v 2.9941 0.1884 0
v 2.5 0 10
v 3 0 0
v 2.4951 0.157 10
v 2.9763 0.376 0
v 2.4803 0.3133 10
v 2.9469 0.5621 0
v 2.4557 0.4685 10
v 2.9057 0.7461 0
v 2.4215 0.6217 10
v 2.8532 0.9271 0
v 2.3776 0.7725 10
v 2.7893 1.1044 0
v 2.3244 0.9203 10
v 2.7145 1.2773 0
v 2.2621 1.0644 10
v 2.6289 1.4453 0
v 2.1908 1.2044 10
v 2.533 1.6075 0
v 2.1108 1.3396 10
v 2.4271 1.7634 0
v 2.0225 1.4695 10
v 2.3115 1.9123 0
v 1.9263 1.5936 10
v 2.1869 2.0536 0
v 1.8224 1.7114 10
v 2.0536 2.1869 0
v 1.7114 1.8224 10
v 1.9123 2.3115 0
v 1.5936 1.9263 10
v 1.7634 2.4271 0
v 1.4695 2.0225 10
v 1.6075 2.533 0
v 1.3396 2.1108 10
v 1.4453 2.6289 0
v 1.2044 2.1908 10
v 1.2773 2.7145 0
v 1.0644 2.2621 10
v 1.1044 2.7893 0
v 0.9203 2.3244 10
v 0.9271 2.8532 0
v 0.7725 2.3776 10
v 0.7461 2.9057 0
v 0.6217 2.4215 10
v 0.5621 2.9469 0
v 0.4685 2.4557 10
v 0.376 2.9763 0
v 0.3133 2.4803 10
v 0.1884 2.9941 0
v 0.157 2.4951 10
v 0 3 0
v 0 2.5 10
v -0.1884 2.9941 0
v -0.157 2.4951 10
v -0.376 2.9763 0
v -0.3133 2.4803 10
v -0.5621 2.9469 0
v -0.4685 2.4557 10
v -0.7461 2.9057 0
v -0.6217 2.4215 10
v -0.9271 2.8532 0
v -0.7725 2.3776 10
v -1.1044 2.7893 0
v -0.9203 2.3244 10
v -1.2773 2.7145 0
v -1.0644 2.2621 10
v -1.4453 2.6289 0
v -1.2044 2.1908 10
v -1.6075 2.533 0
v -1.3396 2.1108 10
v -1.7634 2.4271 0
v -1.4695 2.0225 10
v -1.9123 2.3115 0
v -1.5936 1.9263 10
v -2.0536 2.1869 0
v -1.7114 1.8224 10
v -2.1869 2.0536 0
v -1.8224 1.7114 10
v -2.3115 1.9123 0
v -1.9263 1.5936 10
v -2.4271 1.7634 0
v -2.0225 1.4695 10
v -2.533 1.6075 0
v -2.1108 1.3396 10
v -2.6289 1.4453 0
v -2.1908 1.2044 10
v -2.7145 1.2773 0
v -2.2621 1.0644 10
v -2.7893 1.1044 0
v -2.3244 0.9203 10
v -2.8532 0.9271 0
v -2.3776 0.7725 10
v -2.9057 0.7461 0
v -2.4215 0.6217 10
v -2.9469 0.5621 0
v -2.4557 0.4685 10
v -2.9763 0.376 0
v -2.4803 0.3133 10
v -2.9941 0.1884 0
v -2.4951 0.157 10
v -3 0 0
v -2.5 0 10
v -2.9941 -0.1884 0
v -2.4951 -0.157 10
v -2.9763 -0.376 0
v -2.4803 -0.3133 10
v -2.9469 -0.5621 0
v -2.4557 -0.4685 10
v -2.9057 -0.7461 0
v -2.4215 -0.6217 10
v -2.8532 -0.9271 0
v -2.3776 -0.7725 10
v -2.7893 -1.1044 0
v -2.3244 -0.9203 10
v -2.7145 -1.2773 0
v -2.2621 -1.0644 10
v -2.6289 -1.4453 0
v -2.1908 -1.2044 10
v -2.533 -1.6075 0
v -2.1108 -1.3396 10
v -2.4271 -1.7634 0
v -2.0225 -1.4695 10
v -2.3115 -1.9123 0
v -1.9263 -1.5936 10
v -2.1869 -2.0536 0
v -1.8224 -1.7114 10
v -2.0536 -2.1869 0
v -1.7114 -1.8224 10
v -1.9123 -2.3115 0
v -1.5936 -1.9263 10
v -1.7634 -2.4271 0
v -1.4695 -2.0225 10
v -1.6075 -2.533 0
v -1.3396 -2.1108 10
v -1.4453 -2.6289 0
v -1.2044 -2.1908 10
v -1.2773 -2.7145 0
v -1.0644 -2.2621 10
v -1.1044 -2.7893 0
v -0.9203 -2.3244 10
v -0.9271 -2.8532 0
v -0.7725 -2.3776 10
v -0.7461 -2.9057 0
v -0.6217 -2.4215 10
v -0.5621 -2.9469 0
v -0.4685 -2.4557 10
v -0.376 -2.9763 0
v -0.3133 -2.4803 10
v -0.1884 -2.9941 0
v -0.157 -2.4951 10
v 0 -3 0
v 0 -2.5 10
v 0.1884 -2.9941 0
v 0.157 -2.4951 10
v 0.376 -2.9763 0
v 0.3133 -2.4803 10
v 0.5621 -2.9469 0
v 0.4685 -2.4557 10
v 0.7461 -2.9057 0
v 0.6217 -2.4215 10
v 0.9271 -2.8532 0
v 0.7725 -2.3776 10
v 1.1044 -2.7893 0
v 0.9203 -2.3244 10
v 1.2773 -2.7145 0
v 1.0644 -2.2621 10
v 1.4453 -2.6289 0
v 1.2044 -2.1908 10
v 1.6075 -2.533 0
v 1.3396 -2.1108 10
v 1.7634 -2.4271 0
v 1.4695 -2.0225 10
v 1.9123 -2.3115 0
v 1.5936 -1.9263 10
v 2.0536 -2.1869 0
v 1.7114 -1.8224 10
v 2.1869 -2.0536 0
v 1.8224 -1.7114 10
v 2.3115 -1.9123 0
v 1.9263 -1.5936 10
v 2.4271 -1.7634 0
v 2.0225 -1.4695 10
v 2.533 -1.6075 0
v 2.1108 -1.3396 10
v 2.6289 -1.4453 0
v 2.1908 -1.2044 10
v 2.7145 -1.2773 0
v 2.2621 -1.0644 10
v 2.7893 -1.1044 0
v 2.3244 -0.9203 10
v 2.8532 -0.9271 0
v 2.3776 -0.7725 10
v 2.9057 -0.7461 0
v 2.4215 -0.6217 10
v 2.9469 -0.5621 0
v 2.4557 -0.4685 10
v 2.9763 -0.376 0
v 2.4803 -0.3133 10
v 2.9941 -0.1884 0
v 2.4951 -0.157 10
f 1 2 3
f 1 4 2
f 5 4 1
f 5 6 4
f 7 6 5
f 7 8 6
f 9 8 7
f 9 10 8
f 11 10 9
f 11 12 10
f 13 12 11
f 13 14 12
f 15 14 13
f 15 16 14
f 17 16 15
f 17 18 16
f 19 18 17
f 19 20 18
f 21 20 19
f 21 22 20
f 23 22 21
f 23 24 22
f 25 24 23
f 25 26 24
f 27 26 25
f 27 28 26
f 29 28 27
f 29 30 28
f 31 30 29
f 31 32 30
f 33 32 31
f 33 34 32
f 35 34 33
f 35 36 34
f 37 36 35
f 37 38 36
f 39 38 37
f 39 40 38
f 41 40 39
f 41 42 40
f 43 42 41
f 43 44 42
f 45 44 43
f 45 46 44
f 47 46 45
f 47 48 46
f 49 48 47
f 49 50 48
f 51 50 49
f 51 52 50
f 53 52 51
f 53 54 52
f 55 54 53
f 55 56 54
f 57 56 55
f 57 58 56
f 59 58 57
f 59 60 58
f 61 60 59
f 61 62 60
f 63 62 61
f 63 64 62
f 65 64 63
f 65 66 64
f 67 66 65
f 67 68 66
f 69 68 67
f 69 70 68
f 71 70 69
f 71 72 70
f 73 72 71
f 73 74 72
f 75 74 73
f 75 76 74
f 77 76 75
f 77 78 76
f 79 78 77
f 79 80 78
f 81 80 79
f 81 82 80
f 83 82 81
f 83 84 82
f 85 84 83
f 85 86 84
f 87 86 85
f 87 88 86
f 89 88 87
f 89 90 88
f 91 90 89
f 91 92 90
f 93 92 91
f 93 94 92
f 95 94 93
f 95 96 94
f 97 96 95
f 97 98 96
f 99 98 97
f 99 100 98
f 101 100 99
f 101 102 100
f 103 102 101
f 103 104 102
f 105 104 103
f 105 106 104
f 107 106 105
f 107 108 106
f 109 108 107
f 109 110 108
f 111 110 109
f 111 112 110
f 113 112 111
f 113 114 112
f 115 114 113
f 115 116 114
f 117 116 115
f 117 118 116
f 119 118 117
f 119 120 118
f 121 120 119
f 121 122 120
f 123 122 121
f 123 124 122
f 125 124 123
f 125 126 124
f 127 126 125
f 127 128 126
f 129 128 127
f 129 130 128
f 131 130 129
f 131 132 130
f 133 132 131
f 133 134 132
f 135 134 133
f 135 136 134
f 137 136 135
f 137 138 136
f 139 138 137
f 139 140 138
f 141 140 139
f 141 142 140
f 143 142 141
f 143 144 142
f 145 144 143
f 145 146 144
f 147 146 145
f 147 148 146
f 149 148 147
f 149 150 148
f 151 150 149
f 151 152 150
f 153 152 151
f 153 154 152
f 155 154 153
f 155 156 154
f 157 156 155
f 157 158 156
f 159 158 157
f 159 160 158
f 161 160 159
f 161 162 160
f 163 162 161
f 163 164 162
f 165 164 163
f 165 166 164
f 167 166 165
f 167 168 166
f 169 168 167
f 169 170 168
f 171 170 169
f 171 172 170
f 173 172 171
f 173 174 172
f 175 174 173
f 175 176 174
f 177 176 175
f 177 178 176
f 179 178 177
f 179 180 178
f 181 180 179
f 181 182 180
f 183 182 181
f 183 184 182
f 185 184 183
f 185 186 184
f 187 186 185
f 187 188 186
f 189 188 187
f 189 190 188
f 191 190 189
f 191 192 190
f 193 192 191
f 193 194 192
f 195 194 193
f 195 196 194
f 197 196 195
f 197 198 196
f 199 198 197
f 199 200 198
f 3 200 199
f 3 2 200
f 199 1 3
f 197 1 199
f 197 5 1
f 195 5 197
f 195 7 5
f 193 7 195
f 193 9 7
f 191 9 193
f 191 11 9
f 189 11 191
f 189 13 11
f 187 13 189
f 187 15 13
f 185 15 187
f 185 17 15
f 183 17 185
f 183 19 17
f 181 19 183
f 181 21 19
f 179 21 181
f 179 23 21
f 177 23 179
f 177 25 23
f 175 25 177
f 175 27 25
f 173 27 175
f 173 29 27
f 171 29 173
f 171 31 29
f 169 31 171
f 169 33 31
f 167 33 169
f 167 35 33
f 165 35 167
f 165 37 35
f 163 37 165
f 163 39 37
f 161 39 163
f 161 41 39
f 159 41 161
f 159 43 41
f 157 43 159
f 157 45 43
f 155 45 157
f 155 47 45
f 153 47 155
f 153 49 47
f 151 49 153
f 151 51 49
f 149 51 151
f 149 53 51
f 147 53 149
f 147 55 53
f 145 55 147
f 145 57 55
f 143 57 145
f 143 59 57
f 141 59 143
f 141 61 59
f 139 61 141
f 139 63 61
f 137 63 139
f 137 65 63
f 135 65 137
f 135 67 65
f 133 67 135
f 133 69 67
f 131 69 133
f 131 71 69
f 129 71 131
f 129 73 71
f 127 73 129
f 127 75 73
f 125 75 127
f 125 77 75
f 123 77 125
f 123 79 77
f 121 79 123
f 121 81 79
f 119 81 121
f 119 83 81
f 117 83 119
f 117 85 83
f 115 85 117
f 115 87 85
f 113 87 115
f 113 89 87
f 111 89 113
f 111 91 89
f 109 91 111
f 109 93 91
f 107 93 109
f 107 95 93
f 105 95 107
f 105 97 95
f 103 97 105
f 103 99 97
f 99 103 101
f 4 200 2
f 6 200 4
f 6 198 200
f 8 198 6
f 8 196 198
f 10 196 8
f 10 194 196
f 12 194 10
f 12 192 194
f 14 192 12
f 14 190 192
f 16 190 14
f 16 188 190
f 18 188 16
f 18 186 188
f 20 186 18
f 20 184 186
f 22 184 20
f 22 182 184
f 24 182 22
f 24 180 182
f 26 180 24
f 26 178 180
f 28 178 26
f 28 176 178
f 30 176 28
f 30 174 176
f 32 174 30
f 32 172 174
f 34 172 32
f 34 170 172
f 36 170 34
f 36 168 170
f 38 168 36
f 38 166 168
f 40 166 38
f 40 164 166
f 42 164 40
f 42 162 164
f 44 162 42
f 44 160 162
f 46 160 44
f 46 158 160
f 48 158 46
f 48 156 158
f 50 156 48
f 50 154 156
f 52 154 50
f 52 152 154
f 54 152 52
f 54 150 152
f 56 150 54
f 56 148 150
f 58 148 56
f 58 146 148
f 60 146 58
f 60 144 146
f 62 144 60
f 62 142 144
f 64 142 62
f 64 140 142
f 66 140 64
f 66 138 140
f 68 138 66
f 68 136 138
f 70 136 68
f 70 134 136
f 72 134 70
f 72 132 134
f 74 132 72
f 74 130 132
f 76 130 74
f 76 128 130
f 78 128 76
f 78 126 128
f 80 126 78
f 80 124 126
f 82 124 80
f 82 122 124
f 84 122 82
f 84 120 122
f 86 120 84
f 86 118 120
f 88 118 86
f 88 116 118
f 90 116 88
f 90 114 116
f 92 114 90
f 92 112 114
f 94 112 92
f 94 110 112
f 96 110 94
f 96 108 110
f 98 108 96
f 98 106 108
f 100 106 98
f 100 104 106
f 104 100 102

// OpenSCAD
// Generated by Mecha (https://github.com/tomahawkins/mecha)

color([0.5, 0.5, 0.5, 1.0]) cylinder(h = 10.0, r1 = 3.0, r2 = 2.5, center = false, $fn = 100);
